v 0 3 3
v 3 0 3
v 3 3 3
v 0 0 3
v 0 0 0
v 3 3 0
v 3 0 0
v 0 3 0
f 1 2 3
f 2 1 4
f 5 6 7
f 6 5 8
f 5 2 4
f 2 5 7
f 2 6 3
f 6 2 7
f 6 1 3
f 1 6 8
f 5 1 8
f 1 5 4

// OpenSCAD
function involute_intersect_angle (base_radius, radius) = sqrt (pow (radius/base_radius, 2) - 1) * 180 / pi;
function add(a,b) = a + b;
function func1(x=3) = 2*x+1;

echo(add(1,2));
echo(func1());
echo(func1(5));

a=add(1,2);

cube([a,a,a]);
